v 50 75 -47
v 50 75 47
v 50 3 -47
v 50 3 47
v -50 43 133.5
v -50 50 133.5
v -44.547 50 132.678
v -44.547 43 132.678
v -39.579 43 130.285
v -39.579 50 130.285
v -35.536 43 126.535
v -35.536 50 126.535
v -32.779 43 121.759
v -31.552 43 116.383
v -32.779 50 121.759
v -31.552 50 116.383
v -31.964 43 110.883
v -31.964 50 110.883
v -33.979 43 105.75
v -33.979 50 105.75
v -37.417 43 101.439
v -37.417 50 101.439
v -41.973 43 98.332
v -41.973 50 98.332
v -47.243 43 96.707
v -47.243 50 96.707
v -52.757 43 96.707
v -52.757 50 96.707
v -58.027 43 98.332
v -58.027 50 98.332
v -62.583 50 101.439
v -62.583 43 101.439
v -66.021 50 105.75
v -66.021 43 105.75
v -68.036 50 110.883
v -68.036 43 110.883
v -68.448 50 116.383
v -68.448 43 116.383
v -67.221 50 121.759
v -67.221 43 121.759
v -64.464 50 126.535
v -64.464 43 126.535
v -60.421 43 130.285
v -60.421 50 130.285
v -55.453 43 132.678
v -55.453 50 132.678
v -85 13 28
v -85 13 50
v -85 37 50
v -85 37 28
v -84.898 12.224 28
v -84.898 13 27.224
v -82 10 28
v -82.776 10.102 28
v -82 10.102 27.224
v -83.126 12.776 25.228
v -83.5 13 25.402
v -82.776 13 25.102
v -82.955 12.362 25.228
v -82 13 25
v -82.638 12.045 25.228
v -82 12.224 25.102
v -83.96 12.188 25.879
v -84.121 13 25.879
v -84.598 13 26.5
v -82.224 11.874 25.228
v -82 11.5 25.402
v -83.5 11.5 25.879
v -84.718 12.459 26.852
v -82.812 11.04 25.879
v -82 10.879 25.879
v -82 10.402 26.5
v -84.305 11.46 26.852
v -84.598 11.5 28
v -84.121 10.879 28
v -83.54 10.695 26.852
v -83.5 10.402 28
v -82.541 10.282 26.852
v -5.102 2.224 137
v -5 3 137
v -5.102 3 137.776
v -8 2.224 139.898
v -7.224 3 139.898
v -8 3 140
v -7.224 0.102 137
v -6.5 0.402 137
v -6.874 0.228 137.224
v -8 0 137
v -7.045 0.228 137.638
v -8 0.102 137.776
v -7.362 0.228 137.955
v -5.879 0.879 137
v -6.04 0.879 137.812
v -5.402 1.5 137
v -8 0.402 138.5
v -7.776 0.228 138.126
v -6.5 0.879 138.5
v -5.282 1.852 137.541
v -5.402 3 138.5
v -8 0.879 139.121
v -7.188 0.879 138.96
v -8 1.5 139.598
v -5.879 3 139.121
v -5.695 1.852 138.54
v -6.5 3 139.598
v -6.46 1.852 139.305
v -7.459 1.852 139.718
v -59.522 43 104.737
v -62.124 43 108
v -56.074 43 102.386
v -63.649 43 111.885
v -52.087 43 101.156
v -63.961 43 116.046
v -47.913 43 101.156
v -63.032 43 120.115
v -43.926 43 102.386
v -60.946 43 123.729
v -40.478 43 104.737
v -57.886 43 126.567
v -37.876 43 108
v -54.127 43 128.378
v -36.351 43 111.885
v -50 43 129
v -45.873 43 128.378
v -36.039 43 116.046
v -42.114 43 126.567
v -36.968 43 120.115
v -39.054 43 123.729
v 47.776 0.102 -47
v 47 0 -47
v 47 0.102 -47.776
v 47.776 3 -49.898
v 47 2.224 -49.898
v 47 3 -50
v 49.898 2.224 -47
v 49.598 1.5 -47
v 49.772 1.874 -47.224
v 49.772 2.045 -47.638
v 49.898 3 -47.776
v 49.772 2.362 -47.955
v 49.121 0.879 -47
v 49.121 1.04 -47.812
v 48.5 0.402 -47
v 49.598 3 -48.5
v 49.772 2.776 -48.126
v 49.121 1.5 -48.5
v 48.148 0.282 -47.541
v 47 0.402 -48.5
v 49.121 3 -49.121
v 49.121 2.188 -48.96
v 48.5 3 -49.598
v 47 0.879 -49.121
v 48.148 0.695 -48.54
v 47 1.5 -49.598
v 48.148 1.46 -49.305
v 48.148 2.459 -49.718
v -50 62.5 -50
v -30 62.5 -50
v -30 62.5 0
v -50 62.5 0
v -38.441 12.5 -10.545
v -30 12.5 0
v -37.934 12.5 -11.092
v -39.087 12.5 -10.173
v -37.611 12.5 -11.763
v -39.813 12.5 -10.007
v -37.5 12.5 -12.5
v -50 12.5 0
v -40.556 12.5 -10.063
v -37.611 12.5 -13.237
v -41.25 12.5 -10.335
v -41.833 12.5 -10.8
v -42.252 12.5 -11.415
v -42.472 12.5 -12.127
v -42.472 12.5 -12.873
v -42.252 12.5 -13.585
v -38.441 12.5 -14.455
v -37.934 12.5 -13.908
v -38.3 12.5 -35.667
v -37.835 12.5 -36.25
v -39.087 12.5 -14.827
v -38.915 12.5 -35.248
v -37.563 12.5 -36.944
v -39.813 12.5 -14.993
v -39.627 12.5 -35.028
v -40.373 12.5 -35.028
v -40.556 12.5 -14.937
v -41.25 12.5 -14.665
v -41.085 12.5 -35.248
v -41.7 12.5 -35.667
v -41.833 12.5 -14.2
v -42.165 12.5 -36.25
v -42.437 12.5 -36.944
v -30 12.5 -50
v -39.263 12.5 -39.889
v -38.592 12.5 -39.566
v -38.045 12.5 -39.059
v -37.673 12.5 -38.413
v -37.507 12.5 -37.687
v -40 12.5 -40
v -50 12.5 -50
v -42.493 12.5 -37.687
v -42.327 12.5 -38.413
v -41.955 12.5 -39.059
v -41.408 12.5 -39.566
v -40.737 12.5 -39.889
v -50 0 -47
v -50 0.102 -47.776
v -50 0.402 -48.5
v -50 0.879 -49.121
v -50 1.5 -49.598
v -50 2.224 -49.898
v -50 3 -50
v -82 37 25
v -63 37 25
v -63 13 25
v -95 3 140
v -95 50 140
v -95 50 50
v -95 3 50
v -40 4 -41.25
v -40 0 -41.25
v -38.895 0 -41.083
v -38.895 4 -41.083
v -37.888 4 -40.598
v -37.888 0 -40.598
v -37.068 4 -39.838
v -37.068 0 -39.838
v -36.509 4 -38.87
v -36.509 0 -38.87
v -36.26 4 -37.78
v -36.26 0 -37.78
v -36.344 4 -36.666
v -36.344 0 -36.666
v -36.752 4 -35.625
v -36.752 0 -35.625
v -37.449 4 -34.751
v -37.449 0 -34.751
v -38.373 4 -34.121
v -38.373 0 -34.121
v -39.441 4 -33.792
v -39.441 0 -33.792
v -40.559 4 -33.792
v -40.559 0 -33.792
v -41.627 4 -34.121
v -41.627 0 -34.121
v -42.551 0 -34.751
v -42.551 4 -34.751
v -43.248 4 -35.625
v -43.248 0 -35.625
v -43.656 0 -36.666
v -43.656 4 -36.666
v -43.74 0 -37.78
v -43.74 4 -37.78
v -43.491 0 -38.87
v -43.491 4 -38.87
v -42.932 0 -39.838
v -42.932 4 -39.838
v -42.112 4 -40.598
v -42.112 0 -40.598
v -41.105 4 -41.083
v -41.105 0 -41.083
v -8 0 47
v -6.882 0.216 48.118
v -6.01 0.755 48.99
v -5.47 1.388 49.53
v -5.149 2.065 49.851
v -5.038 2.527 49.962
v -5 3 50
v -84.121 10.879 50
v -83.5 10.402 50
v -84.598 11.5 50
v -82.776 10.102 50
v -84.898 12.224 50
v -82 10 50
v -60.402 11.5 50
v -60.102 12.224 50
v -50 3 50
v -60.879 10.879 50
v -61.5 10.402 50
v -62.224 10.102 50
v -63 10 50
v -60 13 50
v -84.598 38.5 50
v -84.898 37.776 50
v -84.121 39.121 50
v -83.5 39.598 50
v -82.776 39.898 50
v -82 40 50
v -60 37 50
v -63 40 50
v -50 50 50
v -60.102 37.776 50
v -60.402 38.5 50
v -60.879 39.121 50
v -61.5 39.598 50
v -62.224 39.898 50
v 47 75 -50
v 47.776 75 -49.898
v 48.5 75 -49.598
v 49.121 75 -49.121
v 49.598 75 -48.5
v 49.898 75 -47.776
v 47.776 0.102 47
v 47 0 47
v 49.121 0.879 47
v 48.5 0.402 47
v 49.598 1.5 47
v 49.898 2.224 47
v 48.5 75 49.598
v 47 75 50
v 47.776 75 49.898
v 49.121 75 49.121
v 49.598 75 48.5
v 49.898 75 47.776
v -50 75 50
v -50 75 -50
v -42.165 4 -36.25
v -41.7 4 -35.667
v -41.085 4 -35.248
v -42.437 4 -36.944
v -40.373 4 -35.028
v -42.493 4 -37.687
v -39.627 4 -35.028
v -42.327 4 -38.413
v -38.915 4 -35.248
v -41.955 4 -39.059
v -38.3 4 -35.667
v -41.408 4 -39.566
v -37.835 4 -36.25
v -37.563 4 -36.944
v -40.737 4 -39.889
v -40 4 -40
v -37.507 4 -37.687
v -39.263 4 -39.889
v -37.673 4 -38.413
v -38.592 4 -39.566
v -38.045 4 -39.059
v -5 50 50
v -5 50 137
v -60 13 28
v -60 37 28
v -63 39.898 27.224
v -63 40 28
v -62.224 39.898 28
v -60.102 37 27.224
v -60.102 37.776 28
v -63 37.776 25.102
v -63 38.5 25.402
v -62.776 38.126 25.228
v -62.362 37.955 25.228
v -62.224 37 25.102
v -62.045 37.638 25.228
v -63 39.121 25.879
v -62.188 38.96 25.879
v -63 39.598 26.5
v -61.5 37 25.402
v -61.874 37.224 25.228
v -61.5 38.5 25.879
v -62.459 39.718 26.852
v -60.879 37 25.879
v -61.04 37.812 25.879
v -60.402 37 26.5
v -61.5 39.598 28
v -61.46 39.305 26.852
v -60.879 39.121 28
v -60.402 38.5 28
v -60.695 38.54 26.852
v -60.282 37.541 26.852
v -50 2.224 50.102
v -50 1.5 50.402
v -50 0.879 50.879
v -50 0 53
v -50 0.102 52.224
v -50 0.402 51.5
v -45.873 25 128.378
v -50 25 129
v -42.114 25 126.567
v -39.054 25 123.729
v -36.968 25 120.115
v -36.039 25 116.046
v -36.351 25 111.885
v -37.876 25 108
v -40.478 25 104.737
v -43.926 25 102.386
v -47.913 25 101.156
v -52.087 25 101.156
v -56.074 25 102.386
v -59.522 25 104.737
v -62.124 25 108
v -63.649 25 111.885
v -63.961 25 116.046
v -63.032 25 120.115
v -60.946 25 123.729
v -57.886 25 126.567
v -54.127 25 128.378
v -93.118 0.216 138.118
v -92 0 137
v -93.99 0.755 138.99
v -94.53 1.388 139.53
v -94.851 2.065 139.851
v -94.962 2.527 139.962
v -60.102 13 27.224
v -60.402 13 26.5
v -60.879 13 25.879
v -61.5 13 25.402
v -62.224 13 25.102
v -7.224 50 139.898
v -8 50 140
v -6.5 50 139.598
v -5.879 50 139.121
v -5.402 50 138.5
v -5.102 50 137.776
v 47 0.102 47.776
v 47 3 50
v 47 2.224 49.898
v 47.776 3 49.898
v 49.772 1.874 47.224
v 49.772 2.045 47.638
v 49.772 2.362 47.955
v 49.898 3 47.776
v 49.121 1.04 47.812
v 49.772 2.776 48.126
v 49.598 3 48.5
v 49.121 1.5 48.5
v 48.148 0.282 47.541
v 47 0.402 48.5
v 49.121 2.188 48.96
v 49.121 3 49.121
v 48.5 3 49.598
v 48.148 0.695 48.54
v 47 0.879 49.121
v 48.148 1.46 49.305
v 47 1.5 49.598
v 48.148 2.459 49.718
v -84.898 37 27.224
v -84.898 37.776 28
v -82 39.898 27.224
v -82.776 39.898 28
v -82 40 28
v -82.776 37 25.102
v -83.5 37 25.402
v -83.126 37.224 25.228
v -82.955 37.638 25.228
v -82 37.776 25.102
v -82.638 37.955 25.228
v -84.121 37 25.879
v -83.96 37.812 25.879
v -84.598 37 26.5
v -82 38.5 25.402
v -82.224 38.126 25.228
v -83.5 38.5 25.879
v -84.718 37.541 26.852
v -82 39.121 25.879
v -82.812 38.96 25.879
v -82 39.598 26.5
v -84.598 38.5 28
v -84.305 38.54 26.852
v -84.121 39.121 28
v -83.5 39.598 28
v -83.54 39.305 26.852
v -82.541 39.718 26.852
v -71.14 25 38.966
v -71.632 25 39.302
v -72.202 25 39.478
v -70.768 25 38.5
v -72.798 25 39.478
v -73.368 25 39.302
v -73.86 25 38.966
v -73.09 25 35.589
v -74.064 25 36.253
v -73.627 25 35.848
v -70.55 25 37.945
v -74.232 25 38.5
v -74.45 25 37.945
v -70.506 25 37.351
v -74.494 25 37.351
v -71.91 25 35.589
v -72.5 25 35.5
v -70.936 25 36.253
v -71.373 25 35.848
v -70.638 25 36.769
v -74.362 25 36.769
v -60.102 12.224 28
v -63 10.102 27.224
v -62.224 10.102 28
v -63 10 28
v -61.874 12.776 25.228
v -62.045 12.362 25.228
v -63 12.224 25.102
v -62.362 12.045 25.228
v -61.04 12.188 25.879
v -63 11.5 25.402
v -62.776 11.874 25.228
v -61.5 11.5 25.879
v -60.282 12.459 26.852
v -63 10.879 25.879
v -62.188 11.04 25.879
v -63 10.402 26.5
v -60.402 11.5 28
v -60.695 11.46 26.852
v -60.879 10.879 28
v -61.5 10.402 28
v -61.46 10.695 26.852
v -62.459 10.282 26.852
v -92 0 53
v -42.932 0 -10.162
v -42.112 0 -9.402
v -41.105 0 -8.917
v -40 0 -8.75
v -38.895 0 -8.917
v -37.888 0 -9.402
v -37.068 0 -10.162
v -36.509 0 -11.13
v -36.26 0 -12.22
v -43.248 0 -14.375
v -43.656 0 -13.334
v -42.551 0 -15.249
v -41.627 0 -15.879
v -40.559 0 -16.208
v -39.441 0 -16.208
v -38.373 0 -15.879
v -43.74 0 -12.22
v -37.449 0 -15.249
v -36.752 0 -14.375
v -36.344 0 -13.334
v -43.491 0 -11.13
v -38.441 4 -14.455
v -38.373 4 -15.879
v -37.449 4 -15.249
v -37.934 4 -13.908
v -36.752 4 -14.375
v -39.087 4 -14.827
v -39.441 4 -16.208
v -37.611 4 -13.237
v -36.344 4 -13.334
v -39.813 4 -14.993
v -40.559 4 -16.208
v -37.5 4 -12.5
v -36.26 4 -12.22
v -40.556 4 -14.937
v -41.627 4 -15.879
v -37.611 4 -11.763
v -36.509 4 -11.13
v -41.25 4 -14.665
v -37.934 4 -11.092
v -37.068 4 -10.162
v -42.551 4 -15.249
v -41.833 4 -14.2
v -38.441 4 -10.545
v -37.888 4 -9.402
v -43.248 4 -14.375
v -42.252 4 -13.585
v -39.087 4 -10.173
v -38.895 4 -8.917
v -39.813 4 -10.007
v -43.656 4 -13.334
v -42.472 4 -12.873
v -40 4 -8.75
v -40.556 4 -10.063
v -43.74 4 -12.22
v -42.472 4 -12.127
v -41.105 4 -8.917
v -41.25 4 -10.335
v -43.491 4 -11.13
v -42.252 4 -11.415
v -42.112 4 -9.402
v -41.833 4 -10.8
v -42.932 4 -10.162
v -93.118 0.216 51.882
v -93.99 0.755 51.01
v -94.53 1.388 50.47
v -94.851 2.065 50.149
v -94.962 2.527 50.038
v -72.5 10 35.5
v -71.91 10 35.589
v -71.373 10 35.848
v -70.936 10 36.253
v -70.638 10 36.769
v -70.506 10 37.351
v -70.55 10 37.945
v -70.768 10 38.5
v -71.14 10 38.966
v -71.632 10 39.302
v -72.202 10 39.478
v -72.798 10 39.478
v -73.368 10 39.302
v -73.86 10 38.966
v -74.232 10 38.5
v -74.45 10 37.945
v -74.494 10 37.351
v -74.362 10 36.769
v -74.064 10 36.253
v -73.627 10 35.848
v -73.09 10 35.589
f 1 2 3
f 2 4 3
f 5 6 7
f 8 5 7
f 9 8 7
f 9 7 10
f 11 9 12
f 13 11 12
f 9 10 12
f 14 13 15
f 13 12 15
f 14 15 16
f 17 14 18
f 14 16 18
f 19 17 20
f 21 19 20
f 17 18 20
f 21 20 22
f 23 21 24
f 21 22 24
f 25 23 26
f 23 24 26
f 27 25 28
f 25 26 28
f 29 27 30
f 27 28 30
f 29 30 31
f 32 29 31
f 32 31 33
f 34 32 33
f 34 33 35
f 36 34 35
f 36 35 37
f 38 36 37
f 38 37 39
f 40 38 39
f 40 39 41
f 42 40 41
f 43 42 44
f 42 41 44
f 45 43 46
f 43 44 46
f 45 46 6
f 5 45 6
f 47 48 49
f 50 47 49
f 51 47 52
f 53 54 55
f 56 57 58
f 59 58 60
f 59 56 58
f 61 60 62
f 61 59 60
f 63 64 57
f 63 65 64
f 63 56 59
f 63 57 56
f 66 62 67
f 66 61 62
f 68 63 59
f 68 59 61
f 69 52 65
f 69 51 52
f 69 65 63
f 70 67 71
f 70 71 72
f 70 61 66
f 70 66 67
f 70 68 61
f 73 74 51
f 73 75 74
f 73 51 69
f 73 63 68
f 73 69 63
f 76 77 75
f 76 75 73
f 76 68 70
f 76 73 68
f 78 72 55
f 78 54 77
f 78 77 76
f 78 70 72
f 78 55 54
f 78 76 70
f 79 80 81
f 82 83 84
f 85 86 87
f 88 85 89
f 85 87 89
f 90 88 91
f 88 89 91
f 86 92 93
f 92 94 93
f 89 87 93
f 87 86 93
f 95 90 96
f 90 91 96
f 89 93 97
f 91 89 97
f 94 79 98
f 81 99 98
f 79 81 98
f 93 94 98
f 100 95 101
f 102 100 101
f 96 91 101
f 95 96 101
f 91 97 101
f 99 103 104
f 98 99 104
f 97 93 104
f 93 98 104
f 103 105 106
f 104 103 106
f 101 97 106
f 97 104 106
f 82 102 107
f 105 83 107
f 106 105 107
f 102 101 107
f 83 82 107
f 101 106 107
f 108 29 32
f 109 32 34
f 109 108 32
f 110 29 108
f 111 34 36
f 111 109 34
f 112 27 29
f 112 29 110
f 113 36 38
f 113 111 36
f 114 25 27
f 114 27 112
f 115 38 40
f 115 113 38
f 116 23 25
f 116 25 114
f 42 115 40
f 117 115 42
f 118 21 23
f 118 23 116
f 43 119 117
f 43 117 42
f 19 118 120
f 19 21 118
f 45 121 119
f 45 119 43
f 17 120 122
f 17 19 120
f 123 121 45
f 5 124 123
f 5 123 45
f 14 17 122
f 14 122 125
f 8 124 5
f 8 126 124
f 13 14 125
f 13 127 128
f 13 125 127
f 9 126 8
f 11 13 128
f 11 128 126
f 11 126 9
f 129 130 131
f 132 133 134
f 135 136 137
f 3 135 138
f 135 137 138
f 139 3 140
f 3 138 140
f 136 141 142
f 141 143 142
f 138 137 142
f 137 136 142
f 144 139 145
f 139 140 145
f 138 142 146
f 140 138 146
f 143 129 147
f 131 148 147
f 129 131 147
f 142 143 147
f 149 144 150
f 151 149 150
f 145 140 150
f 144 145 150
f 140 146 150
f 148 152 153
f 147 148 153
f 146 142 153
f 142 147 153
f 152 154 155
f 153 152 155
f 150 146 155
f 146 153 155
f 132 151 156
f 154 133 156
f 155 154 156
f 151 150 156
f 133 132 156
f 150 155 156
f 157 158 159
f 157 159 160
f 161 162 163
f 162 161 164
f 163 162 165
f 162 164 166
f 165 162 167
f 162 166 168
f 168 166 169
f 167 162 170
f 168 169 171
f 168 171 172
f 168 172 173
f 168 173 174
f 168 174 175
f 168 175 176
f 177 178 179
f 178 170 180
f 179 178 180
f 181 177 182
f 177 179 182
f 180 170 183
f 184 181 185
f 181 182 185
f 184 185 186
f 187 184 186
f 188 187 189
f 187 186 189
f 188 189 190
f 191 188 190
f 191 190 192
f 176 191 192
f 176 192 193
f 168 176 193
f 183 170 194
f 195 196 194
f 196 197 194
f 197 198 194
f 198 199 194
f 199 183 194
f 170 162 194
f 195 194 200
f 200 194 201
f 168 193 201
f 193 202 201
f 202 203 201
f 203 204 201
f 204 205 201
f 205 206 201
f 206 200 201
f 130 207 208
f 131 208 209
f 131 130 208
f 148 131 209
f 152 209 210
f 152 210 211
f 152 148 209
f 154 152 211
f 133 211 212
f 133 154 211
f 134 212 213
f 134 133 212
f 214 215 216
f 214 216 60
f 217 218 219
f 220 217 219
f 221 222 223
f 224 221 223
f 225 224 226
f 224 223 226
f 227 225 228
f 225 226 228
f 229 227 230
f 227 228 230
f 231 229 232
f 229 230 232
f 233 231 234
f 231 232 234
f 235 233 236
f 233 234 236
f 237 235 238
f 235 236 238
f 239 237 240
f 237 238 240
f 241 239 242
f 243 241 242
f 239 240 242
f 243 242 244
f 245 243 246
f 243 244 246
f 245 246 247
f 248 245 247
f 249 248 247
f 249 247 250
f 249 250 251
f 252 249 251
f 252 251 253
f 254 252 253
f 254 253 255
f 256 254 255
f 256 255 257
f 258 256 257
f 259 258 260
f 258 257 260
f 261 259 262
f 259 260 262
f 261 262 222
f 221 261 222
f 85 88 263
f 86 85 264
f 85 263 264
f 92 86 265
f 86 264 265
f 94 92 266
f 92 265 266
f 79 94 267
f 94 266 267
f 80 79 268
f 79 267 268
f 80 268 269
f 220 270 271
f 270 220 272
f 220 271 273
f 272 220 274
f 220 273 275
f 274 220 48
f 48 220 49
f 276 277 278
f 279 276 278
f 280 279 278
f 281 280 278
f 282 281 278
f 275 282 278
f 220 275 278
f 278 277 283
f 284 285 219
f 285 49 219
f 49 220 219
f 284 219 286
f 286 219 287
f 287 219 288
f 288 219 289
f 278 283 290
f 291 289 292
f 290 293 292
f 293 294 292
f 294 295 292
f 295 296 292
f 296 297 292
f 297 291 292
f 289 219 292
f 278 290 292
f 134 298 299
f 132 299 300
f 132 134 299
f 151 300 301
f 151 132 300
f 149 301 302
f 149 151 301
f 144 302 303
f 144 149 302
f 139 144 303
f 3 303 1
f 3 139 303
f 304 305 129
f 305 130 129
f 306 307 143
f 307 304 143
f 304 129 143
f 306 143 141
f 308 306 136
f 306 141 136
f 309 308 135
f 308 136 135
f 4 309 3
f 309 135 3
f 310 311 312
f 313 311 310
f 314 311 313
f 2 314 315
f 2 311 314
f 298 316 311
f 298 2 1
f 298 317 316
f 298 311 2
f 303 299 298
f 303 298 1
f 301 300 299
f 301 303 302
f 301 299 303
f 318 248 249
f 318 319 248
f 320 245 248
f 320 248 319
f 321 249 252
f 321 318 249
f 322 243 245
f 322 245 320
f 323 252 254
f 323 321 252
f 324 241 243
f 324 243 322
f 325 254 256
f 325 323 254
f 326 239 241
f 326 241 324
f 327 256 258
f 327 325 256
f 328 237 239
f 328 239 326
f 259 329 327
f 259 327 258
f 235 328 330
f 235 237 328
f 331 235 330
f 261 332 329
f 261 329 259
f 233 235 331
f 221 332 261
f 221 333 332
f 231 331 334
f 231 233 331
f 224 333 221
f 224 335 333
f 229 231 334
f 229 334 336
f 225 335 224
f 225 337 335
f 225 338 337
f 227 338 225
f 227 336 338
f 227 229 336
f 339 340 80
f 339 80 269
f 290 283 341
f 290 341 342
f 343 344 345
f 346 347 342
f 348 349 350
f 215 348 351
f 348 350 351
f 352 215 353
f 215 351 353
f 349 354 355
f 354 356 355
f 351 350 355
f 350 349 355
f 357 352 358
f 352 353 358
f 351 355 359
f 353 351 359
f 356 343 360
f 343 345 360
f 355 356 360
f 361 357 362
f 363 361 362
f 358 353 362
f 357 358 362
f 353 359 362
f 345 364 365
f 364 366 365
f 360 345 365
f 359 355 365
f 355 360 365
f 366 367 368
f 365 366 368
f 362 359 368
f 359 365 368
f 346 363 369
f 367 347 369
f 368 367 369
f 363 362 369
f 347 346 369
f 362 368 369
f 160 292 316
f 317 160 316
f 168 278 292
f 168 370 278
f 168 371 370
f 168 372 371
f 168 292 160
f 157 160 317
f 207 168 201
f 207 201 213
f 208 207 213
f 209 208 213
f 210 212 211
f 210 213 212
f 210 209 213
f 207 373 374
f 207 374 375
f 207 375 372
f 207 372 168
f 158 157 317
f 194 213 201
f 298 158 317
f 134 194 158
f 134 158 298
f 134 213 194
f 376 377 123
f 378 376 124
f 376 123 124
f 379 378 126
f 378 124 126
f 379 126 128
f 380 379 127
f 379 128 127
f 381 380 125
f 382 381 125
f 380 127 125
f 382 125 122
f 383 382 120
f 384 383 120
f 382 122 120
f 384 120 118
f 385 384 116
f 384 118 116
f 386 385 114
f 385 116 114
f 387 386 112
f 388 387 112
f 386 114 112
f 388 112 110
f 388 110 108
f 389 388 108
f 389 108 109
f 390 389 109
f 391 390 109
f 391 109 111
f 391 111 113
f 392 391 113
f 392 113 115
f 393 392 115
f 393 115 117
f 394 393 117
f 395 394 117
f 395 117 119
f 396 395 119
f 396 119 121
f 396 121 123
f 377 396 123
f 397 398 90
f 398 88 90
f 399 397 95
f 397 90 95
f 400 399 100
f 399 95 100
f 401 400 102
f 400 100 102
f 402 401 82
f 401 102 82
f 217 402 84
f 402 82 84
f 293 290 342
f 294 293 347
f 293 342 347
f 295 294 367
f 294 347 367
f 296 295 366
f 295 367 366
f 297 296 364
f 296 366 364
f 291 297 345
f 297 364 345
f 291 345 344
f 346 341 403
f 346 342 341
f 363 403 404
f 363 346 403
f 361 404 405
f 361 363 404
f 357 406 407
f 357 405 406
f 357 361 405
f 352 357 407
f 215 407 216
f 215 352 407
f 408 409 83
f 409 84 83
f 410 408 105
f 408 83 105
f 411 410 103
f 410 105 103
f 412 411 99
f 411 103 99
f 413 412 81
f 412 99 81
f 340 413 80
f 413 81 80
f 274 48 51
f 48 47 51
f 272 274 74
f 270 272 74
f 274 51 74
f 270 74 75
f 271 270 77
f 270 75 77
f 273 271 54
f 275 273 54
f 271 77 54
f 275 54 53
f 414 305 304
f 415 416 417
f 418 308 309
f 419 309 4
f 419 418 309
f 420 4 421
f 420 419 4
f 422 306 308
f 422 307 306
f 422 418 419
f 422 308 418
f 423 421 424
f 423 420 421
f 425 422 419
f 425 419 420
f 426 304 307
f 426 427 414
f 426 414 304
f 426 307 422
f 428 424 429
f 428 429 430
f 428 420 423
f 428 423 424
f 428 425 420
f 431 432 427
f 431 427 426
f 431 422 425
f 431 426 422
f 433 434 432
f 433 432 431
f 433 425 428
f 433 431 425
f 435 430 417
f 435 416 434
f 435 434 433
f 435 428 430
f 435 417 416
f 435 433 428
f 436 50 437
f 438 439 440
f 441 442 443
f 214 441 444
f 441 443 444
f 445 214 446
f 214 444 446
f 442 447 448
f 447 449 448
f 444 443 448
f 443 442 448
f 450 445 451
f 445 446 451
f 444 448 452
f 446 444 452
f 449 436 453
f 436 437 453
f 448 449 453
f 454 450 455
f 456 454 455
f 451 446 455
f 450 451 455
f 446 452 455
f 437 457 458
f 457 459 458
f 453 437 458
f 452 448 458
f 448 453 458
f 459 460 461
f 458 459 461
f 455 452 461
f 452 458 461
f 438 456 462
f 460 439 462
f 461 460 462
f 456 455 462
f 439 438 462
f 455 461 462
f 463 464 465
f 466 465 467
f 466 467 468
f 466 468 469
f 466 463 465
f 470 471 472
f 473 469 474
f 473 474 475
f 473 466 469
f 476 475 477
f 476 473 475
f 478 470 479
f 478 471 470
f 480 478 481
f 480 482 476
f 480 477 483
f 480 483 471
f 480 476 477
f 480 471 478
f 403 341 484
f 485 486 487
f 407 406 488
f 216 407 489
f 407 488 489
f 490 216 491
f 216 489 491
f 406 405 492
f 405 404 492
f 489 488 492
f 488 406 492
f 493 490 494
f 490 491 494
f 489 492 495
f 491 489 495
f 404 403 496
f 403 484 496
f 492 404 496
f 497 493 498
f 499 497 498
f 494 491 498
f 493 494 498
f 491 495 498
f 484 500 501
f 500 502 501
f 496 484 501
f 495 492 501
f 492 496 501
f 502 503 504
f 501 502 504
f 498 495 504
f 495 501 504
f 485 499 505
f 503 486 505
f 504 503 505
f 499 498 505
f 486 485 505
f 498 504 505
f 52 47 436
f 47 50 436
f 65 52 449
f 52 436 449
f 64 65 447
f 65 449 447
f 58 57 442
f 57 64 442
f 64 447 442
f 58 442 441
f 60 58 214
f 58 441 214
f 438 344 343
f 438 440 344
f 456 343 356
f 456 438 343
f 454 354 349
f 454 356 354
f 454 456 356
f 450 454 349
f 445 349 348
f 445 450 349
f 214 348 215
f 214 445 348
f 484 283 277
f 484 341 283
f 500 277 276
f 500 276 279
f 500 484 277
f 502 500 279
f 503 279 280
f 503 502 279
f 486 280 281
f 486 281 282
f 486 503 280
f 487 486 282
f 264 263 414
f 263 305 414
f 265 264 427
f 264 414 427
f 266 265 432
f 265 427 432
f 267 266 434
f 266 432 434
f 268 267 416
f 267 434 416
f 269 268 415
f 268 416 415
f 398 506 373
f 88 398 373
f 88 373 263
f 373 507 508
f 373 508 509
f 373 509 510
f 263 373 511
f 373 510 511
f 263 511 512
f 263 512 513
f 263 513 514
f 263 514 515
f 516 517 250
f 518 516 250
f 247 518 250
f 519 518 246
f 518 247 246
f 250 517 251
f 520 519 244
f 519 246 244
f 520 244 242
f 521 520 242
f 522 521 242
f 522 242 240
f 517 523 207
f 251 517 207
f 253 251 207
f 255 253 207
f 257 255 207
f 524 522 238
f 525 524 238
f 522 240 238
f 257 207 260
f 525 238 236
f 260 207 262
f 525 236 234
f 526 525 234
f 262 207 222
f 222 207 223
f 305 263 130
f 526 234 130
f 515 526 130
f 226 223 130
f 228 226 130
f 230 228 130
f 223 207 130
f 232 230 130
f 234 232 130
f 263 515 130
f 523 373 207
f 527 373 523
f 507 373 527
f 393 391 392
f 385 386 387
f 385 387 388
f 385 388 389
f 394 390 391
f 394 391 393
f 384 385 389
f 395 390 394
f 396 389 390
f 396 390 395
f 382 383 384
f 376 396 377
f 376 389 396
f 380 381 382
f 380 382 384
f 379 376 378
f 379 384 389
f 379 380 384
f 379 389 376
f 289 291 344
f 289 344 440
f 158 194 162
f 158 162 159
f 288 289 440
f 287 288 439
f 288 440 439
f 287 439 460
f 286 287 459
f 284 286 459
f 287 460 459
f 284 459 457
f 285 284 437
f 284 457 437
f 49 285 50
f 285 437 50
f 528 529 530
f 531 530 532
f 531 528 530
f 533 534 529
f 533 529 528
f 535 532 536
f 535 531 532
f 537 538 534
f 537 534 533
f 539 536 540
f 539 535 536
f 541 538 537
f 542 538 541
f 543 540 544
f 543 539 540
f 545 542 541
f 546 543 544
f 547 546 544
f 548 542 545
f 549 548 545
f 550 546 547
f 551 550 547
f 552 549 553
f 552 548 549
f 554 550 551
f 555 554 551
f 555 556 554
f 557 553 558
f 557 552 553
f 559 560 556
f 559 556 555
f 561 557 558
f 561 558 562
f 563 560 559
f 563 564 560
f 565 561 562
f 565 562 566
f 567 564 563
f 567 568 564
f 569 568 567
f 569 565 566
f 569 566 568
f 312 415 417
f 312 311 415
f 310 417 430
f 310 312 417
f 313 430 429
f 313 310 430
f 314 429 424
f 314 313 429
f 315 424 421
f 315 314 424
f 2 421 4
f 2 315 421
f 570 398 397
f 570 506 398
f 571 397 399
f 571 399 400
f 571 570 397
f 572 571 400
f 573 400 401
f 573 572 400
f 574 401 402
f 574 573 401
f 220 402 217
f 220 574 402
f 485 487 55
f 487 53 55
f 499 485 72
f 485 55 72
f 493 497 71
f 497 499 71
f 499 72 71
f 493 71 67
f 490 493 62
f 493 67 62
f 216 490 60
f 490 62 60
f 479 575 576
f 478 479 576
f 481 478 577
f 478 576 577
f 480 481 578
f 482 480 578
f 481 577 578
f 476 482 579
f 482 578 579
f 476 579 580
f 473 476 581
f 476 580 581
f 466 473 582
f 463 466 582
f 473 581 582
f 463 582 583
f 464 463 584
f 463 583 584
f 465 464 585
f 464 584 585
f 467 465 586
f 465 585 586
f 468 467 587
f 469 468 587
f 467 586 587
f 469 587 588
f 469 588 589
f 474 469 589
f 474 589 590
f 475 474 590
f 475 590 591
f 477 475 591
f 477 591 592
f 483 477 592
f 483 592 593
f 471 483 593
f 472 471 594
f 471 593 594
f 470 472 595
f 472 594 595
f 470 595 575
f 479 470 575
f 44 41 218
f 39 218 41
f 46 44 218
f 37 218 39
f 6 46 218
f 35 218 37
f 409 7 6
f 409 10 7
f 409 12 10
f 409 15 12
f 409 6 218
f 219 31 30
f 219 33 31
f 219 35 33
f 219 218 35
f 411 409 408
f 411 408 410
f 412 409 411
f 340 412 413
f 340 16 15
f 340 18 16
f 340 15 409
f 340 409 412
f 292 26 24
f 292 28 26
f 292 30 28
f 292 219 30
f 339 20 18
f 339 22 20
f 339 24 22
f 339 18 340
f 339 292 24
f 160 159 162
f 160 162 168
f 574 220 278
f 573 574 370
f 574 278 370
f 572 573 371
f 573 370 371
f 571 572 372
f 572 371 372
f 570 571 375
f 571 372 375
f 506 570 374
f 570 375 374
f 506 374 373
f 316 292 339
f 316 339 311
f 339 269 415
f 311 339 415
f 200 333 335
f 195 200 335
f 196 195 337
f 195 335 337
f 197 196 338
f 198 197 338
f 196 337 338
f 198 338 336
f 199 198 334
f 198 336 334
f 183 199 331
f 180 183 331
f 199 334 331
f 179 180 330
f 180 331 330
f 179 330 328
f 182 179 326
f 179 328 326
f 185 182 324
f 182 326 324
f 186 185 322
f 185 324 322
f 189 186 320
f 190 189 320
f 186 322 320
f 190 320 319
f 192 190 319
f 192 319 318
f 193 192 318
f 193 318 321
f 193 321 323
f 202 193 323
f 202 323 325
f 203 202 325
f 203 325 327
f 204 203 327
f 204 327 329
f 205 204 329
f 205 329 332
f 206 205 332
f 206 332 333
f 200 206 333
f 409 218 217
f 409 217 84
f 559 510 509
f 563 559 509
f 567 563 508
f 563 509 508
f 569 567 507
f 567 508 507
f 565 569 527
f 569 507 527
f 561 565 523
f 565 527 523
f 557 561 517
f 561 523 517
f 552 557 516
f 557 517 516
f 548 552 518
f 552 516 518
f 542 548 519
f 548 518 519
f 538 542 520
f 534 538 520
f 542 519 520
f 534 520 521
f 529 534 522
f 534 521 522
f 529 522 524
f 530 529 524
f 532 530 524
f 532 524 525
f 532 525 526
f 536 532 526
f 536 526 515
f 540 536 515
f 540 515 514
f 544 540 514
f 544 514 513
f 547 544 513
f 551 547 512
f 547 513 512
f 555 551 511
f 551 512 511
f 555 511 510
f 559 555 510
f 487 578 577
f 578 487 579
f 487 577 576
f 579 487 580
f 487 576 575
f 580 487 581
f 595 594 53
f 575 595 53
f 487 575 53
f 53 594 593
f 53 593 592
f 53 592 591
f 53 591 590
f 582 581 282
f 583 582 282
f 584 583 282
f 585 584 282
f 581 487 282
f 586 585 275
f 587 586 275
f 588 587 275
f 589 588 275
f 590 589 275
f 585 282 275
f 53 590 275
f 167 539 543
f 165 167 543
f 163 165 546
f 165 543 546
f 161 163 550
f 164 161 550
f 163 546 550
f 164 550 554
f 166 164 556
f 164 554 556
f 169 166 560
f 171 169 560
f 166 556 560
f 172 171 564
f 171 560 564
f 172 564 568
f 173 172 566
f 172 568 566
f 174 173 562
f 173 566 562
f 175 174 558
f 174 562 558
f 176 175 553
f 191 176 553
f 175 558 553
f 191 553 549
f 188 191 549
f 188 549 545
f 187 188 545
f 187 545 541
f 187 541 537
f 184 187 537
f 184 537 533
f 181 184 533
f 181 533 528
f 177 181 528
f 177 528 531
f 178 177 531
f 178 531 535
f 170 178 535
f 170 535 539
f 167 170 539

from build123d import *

# Parameters (mm, degrees)
SKETCH1_W           = 100
SKETCH1_H           = 100
BOSS_EXTRUDE1_DEPTH = 50
SKETCH8_W           = 90
SKETCH8_H           = 90
BOSS_EXTRUDE4_DEPTH = 50
SKETCH9_R           = 18.5
CUT_EXTRUDE1_DEPTH  = 7
SKETCH10_R          = 14
CUT_EXTRUDE2_DEPTH  = 25
SKETCH11_W          = 25
SKETCH11_H          = 30
BOSS_EXTRUDE5_DEPTH = 25
SKETCH12_W          = 100
SKETCH12_H          = 100
BOSS_EXTRUDE6_DEPTH = 25
SKETCH13_W          = 20
SKETCH13_H          = 50
CUT_EXTRUDE3_DEPTH  = 50
SKETCH14_R          = 2
CUT_EXTRUDE4_DEPTH  = 15
SKETCH15_R          = 2.5
CUT_EXTRUDE5_DEPTH  = 15
SKETCH16_R          = 3.75
CUT_EXTRUDE6_DEPTH  = 4
FILLET1_R           = 3


with BuildPart() as part:
    # Sketch1 → Boss-Extrude1 (new body)
    with BuildSketch(Plane(origin=(0, 0, 0), x_dir=(1, 0, 0), z_dir=(0, 1, 0))):
        Rectangle(SKETCH1_W, SKETCH1_H)
    extrude(amount=BOSS_EXTRUDE1_DEPTH)

    # Sketch8 → Boss-Extrude4 (add)
    with BuildSketch(Plane(origin=(0, 50, 0), x_dir=(1, 0, 0), z_dir=(0, 1, 0))):
        with Locations((-50, -95)):
            Rectangle(SKETCH8_W, SKETCH8_H)
    extrude(amount=-BOSS_EXTRUDE4_DEPTH)

    # Sketch9 → Cut-Extrude1 (cut)
    with BuildSketch(Plane(origin=(0, 50, 0), x_dir=(1, 0, 0), z_dir=(0, 1, 0))):
        with Locations(Location((-50, -115, 0), (0, 0, 270))):
            Circle(SKETCH9_R)
    extrude(amount=-CUT_EXTRUDE1_DEPTH, mode=Mode.SUBTRACT)

    # Sketch10 → Cut-Extrude2 (cut)
    with BuildSketch(Plane(origin=(0, 50, 0), x_dir=(1, 0, 0), z_dir=(0, 1, 0))):
        with Locations(Location((-50, -115, 0), (0, 0, 270))):
            Circle(SKETCH10_R)
    extrude(amount=-CUT_EXTRUDE2_DEPTH, mode=Mode.SUBTRACT)

    # Sketch11 → Boss-Extrude5 (add)
    with BuildSketch(Plane(origin=(0, 0, 50), x_dir=(-1, 0, 0), z_dir=(0, 0, -1))):
        with Locations((72.5, 25)):
            Rectangle(SKETCH11_W, SKETCH11_H)
    extrude(amount=BOSS_EXTRUDE5_DEPTH)

    # Sketch12 → Boss-Extrude6 (add)
    with BuildSketch(Plane(origin=(0, 50, 0), x_dir=(1, 0, 0), z_dir=(0, 1, 0))):
        Rectangle(SKETCH12_W, SKETCH12_H)
    extrude(amount=BOSS_EXTRUDE6_DEPTH)

    # Sketch13 → Cut-Extrude3 (cut)
    with BuildSketch(Plane(origin=(0, 0, -50), x_dir=(-1, 0, 0), z_dir=(0, 0, -1))):
        with Locations((40, 37.5)):
            Rectangle(SKETCH13_W, SKETCH13_H)
    extrude(amount=-CUT_EXTRUDE3_DEPTH, mode=Mode.SUBTRACT)

    # Sketch14 → Cut-Extrude4 (cut)
    with BuildSketch(Plane.XZ.offset(-10)):
        with Locations(Location((-72.5, 37.5, 0), (0, 0, 270))):
            Circle(SKETCH14_R)
    extrude(amount=-CUT_EXTRUDE4_DEPTH, mode=Mode.SUBTRACT)

    # Sketch15 → Cut-Extrude5 (cut)
    with BuildSketch(Plane.XZ):
        with Locations(Location((-40, -37.5, 0), (0, 0, 270))):
            Circle(SKETCH15_R)
        with Locations((-40, -12.5)):
            Circle(SKETCH15_R)
    extrude(amount=-CUT_EXTRUDE5_DEPTH, mode=Mode.SUBTRACT)

    # Sketch16 → Cut-Extrude6 (cut)
    with BuildSketch(Plane.XZ):
        with Locations(Location((-40, -37.5, 0), (0, 0, 270))):
            Circle(SKETCH16_R)
        with Locations(Location((-40, -12.5, 0), (0, 0, 90))):
            Circle(SKETCH16_R)
    extrude(amount=-CUT_EXTRUDE6_DEPTH, mode=Mode.SUBTRACT)

    # Fillet1
    fillet1_edges = [part.edges().sort_by_distance(p)[0] for p in [
        (22.5, 0, 50),
        (-5, 25, 140),
        (-5, 0, 95),
        (-50, 0, 140),
        (-95, 0, 95),
        (-72.5, 0, 50),
        (-85, 10, 37.5),
        (-85, 40, 37.5),
        (-60, 40, 37.5),
        (-60, 10, 37.5),
        (-85, 25, 25),
        (-72.5, 40, 25),
        (-60, 25, 25),
        (-72.5, 10, 25),
        (0, 0, -50),
        (50, 0, 0),
        (50, 37.5, 50),
        (50, 37.5, -50),
    ]]
    fillet(fillet1_edges, radius=FILLET1_R)


solid = part.part
